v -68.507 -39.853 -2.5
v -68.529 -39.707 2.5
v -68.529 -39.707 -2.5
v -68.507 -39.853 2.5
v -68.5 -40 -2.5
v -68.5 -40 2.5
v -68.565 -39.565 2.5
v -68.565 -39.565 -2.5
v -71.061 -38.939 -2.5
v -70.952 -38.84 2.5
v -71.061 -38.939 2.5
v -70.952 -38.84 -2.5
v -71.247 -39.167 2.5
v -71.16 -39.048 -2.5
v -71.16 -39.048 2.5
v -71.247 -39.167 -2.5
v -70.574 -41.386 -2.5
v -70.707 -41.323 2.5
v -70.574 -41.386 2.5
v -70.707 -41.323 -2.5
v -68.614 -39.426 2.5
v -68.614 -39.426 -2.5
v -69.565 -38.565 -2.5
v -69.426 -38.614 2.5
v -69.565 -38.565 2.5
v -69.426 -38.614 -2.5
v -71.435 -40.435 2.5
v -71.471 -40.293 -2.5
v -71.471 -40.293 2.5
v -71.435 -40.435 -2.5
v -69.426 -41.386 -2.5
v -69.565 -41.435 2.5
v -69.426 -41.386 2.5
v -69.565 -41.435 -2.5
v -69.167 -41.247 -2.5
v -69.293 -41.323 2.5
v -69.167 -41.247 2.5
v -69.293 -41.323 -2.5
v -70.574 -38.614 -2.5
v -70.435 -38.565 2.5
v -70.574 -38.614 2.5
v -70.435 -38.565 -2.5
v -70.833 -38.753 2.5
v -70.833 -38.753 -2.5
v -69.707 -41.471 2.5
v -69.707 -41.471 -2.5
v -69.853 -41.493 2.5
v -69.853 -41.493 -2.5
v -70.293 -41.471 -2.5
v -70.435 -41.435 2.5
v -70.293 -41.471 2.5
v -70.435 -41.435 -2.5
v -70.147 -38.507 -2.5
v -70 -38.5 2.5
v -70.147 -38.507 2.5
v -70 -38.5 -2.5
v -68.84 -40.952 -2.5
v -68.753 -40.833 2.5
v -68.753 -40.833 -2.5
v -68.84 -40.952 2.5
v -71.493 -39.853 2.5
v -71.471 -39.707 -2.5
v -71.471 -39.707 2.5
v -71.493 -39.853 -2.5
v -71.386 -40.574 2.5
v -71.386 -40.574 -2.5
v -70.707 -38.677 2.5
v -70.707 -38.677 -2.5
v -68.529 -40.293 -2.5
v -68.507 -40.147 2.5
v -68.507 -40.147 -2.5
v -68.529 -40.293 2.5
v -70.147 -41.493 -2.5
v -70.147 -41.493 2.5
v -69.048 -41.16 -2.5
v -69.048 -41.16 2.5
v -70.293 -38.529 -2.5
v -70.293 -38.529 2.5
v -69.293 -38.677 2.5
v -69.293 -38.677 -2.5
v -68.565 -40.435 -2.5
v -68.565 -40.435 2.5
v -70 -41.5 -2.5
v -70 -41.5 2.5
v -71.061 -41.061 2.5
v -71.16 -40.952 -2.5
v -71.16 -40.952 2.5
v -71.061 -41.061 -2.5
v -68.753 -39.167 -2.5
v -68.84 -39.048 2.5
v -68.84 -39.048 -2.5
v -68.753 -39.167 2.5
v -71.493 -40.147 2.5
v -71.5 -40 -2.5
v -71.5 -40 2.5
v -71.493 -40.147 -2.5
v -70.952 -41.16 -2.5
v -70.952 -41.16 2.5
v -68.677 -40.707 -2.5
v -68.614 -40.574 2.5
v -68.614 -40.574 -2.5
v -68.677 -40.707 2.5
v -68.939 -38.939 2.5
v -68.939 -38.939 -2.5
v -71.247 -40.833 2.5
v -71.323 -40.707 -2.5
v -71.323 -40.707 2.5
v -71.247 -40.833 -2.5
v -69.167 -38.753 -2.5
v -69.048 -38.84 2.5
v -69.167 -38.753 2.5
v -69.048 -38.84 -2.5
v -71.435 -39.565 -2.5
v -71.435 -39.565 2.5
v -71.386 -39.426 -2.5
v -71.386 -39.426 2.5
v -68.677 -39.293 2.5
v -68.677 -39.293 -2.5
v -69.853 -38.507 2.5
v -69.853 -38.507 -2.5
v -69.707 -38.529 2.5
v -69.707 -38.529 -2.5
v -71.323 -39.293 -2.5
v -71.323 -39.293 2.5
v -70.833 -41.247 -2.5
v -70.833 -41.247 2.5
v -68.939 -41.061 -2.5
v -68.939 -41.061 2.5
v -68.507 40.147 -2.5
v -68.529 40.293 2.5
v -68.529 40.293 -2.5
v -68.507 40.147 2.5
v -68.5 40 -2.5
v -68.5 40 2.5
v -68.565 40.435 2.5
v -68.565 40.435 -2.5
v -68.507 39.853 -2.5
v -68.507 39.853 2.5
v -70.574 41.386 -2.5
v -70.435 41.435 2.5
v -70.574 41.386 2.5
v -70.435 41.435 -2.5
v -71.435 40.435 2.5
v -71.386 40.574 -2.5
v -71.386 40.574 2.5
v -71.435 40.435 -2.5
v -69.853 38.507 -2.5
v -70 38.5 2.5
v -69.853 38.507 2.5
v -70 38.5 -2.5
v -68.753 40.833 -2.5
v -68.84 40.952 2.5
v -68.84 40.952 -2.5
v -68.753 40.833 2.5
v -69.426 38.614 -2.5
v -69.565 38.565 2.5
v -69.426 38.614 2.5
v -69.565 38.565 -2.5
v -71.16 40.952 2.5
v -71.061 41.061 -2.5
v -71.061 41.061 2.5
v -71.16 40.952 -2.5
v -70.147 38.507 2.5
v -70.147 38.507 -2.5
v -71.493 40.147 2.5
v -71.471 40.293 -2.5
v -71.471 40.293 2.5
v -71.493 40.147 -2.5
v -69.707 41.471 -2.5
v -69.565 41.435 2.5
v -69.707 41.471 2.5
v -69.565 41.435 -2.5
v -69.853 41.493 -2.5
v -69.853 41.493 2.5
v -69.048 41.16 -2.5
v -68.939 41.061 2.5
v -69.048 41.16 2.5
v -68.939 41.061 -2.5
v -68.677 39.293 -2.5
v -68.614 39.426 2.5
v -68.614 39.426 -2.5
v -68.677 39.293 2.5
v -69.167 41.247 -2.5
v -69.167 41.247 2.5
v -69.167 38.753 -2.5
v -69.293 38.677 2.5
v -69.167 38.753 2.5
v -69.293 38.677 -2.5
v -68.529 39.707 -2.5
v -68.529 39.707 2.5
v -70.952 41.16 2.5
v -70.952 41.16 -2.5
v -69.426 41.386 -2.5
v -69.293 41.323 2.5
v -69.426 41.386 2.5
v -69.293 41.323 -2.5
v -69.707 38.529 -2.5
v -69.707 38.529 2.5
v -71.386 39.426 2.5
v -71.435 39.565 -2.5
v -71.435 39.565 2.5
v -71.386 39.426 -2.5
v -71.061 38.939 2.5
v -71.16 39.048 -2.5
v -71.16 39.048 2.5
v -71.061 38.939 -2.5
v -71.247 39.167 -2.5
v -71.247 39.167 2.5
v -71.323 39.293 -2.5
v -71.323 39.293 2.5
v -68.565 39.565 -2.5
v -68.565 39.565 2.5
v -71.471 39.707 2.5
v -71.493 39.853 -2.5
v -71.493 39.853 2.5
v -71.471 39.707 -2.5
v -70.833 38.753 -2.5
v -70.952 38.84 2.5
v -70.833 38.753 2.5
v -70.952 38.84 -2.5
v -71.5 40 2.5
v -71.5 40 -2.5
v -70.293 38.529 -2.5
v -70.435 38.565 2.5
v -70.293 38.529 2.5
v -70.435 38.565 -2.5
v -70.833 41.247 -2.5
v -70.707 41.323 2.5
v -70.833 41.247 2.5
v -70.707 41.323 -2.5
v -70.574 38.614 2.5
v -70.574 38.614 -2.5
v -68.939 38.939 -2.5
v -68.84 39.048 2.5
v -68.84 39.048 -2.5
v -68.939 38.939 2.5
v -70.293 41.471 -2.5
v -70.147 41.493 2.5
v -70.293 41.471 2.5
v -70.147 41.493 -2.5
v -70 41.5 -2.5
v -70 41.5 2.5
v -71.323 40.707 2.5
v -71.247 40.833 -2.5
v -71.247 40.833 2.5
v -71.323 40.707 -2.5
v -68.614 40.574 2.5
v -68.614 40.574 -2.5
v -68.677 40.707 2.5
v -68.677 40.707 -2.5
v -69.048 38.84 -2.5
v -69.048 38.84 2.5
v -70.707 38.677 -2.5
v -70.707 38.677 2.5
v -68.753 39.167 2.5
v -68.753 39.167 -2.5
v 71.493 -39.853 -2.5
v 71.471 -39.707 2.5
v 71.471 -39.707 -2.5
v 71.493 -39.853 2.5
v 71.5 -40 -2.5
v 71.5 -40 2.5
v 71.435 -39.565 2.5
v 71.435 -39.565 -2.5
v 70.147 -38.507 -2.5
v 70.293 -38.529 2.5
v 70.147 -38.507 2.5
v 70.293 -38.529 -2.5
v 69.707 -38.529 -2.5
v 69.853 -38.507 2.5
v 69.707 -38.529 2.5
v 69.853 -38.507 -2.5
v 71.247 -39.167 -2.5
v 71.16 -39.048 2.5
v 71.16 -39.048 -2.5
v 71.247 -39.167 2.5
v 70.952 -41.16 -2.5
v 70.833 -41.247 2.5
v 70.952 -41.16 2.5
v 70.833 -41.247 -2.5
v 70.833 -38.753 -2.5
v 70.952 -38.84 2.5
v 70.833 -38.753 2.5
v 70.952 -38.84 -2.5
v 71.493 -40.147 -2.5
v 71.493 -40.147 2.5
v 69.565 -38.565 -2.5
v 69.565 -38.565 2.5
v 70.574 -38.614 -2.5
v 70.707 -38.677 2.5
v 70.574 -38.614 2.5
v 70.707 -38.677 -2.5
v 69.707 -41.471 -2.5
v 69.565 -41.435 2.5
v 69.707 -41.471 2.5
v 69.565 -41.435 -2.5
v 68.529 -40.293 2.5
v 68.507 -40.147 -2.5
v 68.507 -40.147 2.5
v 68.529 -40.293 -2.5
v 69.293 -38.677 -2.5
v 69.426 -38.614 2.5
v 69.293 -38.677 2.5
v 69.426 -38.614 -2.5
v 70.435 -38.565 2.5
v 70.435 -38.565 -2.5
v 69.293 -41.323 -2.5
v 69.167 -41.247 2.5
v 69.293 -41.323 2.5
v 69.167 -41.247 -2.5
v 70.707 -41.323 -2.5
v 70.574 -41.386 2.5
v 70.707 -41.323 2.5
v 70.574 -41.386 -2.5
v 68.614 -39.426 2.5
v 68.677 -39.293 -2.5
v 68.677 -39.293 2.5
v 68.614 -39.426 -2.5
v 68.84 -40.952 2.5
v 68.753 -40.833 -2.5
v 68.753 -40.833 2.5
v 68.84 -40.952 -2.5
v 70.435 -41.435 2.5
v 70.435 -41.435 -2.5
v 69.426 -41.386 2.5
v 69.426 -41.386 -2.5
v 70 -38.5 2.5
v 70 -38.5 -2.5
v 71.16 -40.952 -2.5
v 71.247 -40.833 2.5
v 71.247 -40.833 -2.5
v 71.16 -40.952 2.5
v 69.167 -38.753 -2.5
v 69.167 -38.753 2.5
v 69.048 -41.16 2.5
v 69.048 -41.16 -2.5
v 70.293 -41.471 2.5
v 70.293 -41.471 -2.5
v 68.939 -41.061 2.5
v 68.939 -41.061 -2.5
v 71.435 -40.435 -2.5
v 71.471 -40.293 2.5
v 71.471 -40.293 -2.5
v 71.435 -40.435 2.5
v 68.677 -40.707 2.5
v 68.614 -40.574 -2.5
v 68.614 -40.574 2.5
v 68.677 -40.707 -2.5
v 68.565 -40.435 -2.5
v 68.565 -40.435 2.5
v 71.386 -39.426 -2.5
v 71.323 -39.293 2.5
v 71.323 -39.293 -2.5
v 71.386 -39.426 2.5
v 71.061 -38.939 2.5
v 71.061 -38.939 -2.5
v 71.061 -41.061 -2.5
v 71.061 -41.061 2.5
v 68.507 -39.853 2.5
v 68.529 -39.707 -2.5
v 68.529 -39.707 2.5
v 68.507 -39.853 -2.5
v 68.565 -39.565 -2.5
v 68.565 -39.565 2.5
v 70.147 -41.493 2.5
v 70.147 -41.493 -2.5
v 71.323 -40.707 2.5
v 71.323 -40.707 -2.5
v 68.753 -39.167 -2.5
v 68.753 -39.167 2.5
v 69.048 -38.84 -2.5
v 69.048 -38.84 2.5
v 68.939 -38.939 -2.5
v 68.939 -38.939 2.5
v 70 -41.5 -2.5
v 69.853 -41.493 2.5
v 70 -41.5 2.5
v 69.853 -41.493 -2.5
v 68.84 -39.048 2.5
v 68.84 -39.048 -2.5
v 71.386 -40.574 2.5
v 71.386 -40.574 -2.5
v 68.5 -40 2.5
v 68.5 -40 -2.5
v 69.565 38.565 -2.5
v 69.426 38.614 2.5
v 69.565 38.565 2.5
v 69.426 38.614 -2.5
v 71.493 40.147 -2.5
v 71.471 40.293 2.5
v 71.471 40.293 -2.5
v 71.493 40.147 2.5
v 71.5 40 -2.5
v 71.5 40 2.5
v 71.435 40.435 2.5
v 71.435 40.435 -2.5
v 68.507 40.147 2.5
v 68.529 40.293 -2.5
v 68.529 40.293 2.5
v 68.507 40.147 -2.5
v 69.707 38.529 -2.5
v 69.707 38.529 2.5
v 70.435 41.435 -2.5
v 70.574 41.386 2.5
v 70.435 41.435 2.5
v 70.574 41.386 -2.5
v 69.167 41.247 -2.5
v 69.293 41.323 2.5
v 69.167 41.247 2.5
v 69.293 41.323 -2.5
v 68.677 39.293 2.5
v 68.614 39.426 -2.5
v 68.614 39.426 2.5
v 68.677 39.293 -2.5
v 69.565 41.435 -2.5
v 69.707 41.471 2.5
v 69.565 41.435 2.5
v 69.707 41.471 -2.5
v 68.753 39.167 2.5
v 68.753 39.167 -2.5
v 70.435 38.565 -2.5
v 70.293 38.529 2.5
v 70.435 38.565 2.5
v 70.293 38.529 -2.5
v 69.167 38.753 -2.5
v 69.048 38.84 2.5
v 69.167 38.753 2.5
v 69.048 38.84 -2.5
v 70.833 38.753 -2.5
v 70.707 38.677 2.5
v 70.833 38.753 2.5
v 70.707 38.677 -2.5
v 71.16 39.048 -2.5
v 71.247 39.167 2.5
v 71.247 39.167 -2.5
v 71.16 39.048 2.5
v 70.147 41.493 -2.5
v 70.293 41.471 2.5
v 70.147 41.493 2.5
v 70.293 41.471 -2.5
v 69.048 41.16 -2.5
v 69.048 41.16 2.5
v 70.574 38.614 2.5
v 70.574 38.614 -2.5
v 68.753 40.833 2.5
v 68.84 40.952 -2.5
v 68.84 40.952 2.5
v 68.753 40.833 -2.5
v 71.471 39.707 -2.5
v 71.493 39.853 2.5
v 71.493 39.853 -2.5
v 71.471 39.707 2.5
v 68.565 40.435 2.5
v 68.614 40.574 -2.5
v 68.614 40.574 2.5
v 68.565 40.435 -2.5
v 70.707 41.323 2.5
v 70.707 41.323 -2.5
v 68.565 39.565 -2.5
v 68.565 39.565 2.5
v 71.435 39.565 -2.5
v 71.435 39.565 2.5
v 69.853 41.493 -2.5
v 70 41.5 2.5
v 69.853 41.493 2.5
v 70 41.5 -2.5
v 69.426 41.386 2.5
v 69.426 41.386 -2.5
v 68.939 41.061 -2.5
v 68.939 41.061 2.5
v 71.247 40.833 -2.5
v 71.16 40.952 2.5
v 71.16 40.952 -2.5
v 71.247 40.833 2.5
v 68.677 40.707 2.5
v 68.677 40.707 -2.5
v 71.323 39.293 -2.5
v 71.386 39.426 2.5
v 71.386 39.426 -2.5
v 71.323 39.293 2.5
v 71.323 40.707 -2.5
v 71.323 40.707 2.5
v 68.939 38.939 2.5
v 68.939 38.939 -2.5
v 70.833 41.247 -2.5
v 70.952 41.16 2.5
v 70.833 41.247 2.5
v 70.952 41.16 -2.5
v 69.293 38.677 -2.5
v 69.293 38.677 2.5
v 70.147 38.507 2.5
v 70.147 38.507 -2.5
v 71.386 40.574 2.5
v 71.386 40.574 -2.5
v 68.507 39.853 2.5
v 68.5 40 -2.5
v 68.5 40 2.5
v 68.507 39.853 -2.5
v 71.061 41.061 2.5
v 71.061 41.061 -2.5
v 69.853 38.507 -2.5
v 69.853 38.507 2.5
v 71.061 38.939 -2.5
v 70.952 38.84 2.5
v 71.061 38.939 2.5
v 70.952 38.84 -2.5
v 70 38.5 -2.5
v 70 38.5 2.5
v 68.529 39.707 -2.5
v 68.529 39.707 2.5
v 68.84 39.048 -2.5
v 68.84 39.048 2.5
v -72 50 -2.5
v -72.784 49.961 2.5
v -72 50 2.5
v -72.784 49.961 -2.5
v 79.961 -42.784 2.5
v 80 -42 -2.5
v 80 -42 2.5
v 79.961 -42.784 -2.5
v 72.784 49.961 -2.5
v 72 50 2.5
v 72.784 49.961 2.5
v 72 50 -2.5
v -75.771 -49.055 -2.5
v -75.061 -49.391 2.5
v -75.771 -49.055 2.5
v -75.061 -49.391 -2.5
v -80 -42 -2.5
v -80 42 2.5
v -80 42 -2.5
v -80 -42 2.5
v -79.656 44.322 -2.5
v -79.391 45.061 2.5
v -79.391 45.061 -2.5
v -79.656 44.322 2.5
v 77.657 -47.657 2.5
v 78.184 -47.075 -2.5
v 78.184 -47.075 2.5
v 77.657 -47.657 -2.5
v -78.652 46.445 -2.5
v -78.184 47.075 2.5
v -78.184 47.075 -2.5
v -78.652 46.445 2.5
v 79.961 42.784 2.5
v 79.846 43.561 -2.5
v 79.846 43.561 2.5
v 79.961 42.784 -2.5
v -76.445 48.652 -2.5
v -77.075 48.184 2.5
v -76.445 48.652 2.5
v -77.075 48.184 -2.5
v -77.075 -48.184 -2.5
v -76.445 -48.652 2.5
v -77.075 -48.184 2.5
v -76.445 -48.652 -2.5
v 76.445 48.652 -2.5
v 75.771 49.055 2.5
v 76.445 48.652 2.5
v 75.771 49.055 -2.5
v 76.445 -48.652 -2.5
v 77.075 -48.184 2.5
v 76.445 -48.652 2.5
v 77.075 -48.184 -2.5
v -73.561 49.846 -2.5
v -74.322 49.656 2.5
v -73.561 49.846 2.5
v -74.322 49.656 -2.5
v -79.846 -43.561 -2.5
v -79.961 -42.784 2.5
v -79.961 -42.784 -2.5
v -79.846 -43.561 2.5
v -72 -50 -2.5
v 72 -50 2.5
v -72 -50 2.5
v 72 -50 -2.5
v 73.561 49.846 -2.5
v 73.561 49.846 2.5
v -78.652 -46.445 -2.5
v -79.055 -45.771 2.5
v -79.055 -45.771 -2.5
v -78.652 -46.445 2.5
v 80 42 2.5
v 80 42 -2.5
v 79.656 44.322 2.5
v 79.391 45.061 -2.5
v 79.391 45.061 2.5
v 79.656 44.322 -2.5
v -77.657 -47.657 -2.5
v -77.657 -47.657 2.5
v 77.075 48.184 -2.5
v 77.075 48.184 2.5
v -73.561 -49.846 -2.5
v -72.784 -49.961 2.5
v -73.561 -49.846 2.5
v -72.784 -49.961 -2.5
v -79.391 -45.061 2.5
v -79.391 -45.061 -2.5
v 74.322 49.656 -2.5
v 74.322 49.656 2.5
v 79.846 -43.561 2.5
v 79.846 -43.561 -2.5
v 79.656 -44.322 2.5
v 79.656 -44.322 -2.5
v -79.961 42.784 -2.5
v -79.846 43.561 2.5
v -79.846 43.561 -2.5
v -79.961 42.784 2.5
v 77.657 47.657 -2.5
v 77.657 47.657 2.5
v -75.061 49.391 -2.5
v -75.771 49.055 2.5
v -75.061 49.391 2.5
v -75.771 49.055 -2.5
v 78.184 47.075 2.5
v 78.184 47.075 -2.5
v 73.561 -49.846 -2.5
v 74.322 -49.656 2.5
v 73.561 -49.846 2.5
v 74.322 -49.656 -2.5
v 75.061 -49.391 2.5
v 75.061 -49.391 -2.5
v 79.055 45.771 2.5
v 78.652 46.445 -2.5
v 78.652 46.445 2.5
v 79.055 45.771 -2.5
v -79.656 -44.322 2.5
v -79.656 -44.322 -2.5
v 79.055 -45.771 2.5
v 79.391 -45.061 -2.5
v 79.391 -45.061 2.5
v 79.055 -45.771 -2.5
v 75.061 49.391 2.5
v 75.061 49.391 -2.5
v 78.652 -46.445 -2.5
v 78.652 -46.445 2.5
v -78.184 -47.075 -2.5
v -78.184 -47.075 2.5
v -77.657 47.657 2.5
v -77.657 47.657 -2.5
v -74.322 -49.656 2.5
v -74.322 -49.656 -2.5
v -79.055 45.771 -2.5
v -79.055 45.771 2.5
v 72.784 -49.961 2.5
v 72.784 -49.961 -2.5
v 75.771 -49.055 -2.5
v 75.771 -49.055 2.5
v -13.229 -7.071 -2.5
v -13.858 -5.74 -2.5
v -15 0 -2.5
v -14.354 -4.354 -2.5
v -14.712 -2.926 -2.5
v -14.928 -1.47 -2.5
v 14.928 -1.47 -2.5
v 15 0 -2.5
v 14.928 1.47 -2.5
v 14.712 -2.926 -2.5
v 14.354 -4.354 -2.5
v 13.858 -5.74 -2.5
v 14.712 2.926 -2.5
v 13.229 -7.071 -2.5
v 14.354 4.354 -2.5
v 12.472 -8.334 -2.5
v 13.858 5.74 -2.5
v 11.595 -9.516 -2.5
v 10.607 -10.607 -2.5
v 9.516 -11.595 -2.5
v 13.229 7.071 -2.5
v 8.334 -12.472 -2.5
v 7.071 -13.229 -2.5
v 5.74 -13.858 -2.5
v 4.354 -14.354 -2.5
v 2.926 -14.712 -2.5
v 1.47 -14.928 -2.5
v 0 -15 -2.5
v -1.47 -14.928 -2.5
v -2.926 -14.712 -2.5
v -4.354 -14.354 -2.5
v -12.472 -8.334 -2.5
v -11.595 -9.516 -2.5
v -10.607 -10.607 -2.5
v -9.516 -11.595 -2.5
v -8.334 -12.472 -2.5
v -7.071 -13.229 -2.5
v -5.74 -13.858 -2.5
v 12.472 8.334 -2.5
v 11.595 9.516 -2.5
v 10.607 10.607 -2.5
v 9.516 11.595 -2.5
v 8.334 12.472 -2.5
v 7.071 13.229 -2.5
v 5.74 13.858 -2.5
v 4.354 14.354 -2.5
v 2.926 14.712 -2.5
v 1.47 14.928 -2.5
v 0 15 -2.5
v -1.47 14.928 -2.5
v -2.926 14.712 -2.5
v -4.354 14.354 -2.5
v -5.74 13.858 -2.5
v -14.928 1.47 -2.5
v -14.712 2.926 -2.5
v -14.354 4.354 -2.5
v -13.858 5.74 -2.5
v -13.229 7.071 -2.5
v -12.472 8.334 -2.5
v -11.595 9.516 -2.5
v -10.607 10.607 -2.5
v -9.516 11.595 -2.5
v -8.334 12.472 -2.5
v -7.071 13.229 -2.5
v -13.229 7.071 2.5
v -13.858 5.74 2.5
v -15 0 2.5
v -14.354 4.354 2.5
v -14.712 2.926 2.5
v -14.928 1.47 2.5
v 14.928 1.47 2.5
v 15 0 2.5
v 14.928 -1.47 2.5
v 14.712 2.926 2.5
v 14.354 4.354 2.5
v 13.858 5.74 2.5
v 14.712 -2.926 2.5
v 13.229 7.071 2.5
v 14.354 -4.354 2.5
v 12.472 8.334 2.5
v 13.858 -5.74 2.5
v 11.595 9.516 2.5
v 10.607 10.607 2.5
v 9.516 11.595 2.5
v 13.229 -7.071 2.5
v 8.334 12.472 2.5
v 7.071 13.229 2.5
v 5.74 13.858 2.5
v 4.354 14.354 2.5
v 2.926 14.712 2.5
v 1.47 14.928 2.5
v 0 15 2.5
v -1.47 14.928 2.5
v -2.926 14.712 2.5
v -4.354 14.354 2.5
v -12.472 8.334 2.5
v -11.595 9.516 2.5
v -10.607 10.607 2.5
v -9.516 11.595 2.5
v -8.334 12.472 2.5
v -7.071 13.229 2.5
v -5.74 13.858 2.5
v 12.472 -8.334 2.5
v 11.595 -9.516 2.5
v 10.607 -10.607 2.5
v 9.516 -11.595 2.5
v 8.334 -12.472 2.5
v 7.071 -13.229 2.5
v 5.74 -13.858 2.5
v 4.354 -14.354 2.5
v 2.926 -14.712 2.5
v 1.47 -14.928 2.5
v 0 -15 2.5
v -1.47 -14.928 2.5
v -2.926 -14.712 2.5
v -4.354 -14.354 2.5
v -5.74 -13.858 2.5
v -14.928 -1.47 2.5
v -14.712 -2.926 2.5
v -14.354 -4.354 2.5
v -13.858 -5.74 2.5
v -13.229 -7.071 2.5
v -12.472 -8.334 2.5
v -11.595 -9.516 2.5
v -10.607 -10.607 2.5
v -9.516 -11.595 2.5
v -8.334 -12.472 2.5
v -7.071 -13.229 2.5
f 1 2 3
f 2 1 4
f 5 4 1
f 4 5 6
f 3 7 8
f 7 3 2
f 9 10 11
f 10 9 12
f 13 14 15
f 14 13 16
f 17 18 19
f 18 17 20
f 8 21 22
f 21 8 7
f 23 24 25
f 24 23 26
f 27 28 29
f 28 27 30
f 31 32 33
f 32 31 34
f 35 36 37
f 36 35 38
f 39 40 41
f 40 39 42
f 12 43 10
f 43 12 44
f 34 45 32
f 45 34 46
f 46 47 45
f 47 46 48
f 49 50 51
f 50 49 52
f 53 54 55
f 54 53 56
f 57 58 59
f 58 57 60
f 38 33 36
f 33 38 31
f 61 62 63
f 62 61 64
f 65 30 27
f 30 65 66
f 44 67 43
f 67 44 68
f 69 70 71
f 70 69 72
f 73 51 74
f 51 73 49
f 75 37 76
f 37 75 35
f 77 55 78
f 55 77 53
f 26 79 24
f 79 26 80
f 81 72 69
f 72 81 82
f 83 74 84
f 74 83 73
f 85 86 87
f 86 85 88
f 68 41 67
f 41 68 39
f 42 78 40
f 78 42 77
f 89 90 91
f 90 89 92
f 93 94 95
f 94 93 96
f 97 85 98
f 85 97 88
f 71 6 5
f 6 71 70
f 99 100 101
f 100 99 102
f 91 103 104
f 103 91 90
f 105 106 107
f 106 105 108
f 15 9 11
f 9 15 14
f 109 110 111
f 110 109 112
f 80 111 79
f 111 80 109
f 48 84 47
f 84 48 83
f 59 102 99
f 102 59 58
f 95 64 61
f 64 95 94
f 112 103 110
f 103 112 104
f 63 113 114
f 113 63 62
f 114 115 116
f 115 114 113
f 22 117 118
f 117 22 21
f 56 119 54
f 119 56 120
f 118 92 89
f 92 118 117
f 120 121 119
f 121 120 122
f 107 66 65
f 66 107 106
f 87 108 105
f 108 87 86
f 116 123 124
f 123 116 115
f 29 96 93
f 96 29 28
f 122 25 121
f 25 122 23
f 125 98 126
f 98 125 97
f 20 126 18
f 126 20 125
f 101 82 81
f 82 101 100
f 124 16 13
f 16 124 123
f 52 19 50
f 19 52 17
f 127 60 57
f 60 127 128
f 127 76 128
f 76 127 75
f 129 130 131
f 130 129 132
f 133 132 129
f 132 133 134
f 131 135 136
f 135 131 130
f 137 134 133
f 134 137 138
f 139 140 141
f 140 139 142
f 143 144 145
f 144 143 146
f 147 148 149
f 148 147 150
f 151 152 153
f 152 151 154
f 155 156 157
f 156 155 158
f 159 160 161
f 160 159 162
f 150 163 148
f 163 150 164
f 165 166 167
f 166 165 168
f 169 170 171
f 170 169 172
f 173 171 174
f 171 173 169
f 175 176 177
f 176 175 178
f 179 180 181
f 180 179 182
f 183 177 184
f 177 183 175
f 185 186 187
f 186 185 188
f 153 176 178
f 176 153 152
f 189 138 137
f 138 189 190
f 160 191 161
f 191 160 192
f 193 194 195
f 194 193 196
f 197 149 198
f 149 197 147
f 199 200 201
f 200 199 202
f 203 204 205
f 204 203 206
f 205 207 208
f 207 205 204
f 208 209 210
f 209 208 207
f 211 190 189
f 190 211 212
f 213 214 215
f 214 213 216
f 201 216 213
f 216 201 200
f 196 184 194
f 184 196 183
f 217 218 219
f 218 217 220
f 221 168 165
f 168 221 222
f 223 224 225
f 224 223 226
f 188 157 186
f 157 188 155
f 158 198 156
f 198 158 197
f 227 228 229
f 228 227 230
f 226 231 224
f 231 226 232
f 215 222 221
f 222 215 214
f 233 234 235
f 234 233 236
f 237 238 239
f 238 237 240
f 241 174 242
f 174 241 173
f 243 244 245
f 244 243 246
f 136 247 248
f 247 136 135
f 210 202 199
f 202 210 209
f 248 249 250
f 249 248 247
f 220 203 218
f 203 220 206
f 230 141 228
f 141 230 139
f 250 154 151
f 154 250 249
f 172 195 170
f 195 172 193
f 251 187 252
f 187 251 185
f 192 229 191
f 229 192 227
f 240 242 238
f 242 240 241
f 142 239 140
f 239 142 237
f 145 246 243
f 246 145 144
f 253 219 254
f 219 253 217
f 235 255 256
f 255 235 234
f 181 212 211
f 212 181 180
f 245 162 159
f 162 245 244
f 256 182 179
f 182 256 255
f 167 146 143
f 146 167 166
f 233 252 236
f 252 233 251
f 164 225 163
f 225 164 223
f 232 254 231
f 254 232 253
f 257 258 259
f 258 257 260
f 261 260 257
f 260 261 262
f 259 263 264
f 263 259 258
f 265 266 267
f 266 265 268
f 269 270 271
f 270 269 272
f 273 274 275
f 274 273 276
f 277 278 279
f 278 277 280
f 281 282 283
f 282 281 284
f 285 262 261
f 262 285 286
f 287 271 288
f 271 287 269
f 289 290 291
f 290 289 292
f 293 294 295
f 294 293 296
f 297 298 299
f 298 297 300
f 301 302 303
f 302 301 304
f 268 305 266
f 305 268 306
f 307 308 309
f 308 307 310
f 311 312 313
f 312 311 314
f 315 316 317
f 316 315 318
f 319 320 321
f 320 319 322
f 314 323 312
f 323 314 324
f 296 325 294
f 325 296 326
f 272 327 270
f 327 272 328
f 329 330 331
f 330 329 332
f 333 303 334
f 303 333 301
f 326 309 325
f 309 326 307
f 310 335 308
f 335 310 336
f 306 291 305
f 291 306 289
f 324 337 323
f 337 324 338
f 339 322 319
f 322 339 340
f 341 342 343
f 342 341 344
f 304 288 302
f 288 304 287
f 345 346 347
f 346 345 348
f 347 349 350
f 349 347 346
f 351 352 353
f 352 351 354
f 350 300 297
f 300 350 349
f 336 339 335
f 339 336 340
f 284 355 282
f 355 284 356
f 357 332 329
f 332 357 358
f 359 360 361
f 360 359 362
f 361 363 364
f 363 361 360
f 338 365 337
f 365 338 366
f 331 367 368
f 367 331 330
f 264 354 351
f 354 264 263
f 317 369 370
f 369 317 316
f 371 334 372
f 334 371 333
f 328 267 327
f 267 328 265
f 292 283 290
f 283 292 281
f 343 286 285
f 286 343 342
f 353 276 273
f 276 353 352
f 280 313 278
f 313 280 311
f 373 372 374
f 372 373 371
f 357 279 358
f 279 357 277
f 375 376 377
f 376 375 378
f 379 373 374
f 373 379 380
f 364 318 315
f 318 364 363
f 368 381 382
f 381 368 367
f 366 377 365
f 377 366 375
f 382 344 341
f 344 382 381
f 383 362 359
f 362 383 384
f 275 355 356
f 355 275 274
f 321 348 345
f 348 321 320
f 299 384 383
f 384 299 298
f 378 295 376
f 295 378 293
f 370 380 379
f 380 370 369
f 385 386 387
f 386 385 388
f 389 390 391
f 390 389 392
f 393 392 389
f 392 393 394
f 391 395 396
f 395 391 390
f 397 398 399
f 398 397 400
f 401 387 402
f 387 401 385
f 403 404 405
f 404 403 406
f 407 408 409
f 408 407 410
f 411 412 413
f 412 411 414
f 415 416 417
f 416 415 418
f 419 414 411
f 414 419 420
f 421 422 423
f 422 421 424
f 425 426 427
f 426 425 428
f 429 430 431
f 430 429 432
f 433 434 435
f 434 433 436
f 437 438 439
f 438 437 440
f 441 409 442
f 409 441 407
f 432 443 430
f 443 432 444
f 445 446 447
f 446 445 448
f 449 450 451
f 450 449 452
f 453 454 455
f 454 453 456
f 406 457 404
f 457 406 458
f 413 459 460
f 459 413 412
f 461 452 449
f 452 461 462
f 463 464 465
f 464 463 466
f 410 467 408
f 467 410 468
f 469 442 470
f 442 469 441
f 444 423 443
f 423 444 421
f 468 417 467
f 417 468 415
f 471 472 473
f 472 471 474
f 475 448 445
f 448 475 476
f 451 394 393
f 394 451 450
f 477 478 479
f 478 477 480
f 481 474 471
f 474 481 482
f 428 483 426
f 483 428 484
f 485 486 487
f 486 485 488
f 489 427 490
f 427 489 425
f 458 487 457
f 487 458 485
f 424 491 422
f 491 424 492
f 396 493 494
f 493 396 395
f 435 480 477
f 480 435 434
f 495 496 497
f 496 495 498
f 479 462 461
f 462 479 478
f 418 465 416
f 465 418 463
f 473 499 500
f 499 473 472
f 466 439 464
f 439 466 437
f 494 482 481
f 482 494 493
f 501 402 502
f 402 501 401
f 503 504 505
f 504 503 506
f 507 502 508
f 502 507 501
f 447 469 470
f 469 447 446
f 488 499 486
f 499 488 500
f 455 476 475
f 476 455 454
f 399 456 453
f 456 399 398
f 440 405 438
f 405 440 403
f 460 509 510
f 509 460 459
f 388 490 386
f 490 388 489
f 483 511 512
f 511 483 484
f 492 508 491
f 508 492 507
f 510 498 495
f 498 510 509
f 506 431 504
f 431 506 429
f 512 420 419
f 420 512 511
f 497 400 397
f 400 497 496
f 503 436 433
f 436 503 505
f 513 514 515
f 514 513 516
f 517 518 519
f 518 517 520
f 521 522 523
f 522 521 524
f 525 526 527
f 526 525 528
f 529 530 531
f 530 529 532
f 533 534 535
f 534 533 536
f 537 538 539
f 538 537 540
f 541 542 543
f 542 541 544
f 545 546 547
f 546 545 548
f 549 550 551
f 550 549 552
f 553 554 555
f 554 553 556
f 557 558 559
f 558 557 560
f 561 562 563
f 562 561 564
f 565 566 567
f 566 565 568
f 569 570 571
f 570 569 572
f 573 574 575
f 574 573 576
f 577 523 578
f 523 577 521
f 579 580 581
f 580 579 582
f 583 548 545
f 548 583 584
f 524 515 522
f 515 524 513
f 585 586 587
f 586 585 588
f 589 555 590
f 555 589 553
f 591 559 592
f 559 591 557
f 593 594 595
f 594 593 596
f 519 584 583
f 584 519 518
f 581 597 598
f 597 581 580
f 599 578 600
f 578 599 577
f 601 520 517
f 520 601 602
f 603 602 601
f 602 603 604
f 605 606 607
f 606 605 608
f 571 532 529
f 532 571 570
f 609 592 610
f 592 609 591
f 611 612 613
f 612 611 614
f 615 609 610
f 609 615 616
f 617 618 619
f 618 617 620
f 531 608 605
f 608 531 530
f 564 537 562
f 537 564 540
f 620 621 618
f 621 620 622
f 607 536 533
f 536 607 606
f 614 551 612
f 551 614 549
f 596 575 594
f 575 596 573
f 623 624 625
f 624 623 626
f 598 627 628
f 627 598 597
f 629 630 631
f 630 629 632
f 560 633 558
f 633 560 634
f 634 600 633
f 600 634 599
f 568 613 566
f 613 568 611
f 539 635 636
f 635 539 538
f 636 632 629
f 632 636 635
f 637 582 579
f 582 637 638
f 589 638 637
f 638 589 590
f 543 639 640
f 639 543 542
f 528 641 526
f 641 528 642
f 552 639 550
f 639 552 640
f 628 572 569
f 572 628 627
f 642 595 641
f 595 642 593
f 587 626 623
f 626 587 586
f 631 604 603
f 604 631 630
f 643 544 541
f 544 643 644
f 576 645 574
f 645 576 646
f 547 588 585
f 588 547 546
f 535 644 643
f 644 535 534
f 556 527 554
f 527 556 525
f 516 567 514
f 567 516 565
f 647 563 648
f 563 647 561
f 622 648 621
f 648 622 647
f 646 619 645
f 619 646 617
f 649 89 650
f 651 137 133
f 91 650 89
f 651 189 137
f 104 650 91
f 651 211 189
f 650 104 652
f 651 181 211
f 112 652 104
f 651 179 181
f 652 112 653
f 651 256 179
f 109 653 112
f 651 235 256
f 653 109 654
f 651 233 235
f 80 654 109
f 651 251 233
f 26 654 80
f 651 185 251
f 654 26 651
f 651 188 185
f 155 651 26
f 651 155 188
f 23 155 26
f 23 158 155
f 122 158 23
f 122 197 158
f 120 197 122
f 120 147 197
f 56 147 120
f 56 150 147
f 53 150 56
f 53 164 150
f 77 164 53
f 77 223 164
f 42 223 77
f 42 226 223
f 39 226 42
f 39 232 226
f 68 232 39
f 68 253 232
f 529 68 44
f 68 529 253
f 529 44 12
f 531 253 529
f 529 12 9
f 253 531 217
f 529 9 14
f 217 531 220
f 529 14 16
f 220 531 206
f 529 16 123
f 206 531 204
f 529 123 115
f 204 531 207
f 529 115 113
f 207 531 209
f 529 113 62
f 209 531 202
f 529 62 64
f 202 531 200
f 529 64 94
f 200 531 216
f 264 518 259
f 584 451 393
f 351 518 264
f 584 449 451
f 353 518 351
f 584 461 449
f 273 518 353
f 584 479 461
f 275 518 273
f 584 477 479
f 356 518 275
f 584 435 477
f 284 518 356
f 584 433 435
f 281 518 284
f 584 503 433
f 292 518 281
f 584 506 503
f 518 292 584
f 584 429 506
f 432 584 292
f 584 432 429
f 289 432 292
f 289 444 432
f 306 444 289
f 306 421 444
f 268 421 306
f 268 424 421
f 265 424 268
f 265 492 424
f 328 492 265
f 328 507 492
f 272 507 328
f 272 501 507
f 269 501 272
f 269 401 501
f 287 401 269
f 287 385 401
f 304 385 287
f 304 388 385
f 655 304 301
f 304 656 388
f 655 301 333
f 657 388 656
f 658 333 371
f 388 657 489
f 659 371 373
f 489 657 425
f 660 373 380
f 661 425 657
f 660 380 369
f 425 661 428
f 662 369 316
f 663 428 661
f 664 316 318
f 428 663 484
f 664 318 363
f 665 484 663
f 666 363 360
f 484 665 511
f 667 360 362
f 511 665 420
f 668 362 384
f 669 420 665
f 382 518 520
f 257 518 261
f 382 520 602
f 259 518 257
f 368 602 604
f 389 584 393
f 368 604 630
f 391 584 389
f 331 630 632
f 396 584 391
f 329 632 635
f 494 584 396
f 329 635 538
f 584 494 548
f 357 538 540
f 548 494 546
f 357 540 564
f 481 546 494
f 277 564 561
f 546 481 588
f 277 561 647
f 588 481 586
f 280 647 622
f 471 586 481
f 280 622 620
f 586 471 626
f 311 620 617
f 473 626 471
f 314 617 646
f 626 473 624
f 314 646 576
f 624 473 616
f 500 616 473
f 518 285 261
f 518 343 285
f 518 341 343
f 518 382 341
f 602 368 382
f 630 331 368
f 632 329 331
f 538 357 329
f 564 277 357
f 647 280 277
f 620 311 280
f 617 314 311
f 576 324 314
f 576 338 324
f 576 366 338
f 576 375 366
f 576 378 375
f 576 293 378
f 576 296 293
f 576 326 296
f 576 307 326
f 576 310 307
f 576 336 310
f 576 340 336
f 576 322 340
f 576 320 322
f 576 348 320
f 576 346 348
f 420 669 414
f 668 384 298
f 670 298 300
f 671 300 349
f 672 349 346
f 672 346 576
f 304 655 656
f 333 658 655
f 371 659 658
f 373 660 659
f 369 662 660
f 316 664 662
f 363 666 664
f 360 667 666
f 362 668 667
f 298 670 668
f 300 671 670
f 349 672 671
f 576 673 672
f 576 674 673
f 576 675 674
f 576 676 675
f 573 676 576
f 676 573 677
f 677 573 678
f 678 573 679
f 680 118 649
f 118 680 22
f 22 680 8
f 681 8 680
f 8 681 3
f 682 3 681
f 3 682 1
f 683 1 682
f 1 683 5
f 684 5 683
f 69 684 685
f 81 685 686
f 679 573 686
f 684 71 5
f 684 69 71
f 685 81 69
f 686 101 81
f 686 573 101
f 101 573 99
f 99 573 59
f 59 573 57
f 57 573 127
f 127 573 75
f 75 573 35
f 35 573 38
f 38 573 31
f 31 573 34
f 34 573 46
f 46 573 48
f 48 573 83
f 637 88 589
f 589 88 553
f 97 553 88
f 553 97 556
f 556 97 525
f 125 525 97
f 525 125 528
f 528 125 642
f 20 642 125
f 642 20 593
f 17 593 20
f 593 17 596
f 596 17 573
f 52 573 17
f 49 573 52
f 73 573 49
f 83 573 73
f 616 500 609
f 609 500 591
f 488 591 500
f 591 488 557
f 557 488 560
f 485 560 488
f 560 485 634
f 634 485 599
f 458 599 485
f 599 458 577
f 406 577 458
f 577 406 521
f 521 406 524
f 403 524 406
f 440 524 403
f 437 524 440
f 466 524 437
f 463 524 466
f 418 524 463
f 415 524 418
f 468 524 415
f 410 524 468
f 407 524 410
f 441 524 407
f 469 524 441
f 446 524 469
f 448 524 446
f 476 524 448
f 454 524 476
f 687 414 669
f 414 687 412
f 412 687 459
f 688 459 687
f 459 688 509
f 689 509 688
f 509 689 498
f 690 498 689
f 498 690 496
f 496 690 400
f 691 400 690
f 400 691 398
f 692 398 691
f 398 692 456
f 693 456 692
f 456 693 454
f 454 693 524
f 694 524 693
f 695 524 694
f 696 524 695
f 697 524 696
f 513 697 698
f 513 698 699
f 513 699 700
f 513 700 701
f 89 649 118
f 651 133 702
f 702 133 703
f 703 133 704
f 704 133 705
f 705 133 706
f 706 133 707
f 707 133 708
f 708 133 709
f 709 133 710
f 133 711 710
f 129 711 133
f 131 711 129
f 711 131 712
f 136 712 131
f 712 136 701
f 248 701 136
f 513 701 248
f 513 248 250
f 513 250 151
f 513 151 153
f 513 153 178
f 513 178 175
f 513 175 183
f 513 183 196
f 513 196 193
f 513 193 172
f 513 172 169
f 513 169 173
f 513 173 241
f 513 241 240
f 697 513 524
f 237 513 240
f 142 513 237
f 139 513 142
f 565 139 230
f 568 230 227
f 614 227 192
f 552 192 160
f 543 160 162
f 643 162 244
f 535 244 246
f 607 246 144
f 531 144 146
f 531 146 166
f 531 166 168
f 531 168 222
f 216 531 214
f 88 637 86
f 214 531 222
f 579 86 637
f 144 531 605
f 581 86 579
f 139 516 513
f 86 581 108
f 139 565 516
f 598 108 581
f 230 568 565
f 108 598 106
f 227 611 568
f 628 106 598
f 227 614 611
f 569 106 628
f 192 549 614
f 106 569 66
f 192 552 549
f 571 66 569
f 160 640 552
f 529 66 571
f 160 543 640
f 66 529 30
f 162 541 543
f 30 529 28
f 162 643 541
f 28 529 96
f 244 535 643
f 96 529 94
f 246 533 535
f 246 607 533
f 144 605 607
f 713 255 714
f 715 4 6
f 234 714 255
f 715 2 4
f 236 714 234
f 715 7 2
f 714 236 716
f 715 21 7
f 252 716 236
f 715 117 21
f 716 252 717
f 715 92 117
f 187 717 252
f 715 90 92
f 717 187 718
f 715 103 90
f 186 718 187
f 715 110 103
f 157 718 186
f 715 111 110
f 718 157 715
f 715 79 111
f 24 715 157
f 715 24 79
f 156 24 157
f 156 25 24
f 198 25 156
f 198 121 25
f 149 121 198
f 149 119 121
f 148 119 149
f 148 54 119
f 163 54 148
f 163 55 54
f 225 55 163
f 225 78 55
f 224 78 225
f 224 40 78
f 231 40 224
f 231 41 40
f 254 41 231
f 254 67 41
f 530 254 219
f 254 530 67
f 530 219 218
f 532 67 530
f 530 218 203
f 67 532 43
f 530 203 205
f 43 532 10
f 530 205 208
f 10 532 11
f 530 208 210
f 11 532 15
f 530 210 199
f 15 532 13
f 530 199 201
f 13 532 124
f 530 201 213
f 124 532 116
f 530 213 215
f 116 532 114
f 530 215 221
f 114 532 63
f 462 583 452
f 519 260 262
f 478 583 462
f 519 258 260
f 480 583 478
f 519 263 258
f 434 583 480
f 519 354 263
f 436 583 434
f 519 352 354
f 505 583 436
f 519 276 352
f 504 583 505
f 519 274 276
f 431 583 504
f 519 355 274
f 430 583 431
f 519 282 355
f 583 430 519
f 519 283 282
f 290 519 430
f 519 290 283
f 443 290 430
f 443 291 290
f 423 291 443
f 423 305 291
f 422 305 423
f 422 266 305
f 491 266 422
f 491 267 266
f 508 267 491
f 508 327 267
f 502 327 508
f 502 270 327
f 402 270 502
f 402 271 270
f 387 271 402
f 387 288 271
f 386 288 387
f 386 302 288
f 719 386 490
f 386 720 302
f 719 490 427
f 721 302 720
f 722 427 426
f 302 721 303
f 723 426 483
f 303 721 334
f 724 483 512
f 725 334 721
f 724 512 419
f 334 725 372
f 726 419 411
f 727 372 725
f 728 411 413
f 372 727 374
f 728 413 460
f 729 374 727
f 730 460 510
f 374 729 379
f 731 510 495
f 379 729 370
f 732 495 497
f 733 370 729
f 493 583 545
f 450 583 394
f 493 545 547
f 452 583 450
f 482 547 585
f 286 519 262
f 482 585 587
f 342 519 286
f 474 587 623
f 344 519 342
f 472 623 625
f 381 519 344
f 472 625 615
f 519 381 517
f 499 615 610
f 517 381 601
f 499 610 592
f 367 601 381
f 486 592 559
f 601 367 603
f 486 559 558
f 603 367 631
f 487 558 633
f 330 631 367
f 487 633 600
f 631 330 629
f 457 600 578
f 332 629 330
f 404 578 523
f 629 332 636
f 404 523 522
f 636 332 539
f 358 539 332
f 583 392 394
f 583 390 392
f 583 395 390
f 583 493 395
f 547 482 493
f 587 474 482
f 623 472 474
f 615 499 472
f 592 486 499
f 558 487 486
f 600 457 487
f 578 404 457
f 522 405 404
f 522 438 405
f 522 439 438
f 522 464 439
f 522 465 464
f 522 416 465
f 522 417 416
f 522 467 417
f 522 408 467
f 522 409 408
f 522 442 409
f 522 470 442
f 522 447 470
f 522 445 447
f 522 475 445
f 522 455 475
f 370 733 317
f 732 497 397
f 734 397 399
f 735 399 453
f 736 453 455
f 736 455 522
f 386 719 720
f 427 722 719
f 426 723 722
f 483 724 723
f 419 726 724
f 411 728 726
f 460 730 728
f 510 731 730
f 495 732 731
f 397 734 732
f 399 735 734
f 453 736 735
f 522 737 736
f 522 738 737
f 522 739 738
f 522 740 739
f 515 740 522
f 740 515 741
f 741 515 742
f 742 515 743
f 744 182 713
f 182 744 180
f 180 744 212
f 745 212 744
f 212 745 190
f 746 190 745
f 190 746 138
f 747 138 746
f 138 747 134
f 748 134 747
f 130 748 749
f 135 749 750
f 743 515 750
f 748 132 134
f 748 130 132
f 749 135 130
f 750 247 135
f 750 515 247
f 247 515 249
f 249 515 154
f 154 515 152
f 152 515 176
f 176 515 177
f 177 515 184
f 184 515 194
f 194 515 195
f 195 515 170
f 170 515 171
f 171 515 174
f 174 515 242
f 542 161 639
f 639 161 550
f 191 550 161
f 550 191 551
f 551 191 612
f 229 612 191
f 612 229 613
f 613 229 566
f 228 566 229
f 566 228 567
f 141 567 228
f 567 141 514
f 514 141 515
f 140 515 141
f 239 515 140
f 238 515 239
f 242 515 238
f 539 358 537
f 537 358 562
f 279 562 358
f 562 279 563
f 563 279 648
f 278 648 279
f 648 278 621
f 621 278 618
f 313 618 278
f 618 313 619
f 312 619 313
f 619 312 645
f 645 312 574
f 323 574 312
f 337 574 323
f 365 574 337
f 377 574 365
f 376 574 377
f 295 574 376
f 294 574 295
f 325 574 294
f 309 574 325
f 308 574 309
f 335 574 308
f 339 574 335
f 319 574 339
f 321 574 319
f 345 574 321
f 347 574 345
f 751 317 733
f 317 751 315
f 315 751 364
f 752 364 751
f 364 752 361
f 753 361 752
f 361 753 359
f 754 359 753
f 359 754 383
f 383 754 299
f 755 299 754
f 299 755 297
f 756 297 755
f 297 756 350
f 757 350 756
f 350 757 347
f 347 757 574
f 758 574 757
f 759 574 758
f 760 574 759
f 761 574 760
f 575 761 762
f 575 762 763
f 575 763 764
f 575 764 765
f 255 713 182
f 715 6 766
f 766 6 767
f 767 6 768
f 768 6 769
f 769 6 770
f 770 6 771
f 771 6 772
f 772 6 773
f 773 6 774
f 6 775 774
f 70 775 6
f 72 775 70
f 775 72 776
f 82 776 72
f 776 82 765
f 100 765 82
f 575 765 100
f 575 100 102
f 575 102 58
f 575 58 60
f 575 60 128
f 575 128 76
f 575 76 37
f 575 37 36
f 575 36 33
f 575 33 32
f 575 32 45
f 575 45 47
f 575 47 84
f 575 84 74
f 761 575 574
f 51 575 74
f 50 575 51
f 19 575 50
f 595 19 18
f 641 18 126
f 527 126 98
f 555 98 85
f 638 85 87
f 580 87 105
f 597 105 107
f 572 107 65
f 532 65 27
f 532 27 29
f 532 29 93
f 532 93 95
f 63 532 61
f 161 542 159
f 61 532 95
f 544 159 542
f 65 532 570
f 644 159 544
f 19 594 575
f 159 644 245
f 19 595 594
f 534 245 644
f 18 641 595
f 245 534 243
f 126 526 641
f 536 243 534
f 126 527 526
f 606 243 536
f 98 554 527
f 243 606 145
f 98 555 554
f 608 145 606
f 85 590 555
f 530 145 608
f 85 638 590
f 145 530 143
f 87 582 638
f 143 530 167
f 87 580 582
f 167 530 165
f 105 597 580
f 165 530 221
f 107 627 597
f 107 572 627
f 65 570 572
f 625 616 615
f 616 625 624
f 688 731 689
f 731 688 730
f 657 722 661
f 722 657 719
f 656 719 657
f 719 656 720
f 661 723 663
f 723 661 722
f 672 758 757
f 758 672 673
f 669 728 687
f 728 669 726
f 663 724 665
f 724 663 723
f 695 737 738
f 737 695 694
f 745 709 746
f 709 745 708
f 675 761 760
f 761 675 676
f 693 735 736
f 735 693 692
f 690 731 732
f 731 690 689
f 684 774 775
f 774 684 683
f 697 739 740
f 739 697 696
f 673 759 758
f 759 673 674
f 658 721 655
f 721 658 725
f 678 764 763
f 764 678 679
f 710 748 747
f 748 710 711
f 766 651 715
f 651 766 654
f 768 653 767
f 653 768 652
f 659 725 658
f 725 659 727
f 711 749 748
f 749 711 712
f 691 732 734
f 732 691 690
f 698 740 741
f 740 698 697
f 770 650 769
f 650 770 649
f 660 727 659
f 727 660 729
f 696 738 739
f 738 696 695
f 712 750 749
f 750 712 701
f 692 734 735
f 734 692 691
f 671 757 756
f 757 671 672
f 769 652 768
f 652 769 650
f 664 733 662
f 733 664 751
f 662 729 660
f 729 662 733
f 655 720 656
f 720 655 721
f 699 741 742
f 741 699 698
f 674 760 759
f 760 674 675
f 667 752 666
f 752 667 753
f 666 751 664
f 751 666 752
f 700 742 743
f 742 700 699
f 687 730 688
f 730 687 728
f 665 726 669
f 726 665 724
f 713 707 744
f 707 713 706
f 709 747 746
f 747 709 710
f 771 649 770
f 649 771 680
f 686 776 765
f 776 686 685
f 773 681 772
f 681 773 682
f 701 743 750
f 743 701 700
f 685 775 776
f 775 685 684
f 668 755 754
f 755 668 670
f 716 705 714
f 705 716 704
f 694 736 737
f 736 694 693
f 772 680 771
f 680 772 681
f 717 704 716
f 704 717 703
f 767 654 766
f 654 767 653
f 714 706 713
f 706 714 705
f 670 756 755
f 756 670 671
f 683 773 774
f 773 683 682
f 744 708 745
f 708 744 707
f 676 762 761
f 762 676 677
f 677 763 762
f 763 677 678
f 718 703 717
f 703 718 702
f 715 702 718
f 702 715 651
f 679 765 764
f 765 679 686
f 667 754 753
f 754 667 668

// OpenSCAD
// ============================================================================
// 13-DOF HUMAN ROBOT: 16CM TOP FITMENT PLATE WITH 3CM CENTRAL PASS
// Pristine top structural enclosure lid with a large 30mm utility routing hole.
// ============================================================================
$fn = 64;

// --- Global Footprint Dimensions ---
pelvis_l       = 160.0; // Scaled to exactly 16 cm Long
pelvis_w       = 100.0; // 10 cm Wide to match your chassis width spacing
sheet_t        = 5.0;   // 5mm matching structural thickness rules
corner_r       = 8.0;   // Smooth rounded chassis corners
eps            = 0.02;  

// --- 🛑 TOP UTILITY ROUTING HOLE CONFIGURATION 🛑 ---
top_hole_d     = 30.0;  // Exactly 3 cm diameter center utility opening

// --- Perimeter Mounting Hole Matrix ---
chassis_hole_d = 3.0;   // M3 hardware anchoring clearance holes

// ============================================================================
// MAIN GENERATION
// ============================================================================

// Render the clean top fitment plate template
top_enclosure_plate();

// ============================================================================
// MODULE: TOP ENCLOSURE PLATE
// ============================================================================
module top_enclosure_plate() {
    color([0.35, 0.35, 0.38]) { // Technical mid-gray for distinct structural overlay
        difference() {
            // A. Main Solid Plate Shape
            minkowski() {
                cube([pelvis_l - 2*corner_r, pelvis_w - 2*corner_r, sheet_t/2], center=true);
                cylinder(r=corner_r, h=sheet_t/2, center=true);
            }
            
            // B. Central Wire Gateway / Neck Pan Hole (3cm Diameter)
            cylinder(d=top_hole_d, h=sheet_t + 2, center=true);
            
            // C. Perimeter Structural Answering Holes (Anchors cleanly to standoffs/corners)
            for (x_side = [-pelvis_l/2 + 10, pelvis_l/2 - 10]) {
                for (y_side = [-pelvis_w/2 + 10, pelvis_w/2 - 10]) {
                    translate([x_side, y_side, 0])
                        cylinder(d=chassis_hole_d, h=sheet_t + 2, center=true);
                }
            }
        }
    }
}
